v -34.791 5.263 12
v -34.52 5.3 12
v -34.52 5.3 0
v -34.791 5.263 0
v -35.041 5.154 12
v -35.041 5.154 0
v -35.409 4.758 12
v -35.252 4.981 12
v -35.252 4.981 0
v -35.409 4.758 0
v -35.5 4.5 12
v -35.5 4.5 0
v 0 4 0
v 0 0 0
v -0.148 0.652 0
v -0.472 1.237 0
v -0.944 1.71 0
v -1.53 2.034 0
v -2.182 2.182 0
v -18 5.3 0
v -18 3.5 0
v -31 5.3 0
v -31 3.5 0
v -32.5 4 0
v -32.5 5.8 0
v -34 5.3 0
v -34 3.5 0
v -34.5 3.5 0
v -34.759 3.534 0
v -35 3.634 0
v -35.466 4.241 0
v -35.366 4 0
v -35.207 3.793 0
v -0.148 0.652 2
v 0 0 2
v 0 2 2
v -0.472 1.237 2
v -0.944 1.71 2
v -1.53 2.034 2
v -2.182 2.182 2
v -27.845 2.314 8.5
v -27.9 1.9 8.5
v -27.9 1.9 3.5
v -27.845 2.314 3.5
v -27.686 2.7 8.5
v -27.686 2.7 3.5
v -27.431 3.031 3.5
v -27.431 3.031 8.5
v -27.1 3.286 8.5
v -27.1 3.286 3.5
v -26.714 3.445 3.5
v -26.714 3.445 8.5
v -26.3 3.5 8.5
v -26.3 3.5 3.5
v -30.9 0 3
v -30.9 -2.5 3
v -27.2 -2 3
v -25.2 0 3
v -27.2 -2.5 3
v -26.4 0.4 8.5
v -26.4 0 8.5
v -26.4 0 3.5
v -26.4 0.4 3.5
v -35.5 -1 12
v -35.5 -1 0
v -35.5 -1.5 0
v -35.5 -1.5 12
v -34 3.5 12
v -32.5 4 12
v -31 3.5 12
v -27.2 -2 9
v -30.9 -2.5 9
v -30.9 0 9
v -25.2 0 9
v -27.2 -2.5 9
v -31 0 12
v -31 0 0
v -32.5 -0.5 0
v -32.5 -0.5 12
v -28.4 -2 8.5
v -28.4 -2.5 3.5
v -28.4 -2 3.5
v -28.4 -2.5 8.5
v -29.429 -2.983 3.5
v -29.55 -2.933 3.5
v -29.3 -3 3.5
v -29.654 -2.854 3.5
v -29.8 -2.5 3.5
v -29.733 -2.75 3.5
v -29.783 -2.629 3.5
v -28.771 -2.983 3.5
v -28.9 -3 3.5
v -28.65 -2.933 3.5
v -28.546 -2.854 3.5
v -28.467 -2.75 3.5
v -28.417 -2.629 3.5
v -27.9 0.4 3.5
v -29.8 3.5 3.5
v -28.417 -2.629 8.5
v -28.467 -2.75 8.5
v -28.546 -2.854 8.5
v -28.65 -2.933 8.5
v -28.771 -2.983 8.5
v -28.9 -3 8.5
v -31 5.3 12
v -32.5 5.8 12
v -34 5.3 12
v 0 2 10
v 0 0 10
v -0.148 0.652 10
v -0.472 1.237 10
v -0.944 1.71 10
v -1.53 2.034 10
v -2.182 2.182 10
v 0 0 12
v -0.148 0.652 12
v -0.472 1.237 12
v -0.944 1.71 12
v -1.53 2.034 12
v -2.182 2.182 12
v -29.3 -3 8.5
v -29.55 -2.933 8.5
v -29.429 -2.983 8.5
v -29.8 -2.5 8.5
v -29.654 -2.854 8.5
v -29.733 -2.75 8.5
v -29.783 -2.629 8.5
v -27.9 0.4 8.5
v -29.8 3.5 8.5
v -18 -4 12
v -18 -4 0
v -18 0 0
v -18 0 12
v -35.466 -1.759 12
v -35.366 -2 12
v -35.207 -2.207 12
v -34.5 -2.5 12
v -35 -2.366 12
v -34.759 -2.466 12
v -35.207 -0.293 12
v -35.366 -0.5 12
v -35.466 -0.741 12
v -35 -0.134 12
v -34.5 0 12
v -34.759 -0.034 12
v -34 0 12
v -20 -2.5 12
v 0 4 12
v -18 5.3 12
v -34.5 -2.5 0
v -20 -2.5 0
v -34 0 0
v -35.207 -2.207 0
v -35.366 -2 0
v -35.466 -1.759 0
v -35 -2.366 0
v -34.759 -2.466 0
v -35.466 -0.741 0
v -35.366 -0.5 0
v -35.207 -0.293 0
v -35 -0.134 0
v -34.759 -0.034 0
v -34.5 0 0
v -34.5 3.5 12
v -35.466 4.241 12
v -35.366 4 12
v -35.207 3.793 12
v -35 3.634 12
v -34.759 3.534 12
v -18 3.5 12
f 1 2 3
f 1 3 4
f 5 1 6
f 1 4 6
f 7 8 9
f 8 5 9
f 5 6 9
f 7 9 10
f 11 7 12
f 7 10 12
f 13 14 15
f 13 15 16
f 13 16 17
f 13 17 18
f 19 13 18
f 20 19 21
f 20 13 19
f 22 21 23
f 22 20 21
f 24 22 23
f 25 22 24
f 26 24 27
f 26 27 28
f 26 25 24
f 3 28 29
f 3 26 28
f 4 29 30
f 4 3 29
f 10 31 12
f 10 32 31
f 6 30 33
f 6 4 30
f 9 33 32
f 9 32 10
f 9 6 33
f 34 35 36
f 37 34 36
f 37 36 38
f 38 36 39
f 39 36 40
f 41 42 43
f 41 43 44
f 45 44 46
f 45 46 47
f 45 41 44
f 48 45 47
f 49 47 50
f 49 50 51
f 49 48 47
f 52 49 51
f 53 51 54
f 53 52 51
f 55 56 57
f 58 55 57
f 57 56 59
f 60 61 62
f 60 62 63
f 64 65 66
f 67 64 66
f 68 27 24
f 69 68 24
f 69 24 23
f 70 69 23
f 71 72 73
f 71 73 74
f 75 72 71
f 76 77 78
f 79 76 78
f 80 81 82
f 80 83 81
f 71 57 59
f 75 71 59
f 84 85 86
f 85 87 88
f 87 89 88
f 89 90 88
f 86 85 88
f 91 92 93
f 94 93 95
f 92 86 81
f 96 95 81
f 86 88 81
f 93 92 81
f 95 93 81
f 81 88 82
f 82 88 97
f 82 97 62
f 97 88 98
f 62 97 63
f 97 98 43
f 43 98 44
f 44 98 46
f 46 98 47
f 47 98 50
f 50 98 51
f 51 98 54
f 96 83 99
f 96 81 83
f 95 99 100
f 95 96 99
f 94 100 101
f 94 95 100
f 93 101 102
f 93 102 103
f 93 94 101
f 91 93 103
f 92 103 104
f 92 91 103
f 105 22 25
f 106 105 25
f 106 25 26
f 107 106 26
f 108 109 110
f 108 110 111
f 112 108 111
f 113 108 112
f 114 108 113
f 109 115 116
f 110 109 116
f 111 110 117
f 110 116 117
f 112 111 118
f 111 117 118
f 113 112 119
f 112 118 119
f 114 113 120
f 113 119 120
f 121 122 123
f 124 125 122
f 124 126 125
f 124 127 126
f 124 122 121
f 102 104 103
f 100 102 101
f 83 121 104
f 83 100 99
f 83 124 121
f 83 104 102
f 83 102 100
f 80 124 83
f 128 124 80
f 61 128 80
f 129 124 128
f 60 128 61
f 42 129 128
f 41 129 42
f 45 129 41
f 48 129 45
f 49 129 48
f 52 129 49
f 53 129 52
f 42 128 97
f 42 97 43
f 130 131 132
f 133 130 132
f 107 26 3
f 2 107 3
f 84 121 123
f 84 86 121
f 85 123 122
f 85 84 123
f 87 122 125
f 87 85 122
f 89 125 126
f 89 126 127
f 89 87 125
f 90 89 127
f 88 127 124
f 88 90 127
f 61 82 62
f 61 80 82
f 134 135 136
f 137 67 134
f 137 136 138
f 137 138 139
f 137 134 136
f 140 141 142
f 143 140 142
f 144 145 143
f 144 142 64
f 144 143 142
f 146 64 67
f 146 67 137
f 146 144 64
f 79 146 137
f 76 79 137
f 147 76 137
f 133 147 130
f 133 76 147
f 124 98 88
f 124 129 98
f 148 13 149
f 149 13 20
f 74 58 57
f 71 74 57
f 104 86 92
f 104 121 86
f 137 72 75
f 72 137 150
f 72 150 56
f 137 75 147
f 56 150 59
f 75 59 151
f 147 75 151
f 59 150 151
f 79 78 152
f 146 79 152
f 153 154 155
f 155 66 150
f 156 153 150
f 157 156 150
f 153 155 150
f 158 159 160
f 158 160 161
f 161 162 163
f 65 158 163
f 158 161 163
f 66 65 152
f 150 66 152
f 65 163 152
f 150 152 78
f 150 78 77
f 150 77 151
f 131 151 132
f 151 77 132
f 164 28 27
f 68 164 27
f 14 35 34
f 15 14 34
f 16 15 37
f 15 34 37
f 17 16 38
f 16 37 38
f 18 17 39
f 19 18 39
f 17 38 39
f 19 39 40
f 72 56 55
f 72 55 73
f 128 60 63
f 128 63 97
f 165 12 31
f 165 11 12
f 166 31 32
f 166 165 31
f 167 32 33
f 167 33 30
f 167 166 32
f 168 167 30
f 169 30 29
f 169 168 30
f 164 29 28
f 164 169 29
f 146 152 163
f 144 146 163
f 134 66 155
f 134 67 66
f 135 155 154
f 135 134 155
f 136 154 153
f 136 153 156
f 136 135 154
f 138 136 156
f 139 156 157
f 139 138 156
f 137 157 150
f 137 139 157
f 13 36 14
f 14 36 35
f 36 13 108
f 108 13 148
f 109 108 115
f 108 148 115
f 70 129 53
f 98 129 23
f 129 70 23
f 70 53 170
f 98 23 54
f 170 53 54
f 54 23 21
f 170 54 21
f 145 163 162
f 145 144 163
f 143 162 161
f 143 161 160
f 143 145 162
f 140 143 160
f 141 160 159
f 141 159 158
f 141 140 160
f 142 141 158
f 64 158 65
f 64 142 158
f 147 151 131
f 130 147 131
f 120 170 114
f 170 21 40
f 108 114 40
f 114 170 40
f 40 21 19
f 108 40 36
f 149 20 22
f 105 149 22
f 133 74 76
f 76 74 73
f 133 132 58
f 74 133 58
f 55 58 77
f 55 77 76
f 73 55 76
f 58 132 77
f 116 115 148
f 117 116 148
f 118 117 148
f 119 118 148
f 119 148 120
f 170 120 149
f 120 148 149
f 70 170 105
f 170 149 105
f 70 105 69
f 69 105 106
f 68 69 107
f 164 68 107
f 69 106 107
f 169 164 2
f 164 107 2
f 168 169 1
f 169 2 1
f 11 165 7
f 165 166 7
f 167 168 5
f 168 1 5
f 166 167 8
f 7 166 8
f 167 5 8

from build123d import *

# Parameters (mm, degrees)
BOSS_EXTRUDE1_DEPTH   = 12
BOSS_EXTRUDE1_2_DEPTH = 12
SKETCH2_W             = 5.7
SKETCH2_H             = 6
CUT_EXTRUDE1_DEPTH    = 3
BOSS_EXTRUDE2_DEPTH   = 6
BOSS_EXTRUDE3_START   = -6
BOSS_EXTRUDE3_DEPTH   = 2.5
FILLET7_R             = 1
FILLET8_R             = 1
FILLET10_R            = 1
FILLET11_R            = 1
BOSS_EXTRUDE4_DEPTH   = 2
BOSS_EXTRUDE5_START   = -10
BOSS_EXTRUDE5_DEPTH   = 2
FILLET12_R            = 0.5


with BuildPart() as part:
    # Sketch1 → Boss-Extrude1 (new body)
    with BuildSketch(Plane.XY):
        Polygon((0, 4), (-18, 5.3), (-31, 5.3), (-32.5, 5.8), (-34, 5.3), (-35.5, 5.3), (-35.5, 3.5), (-34, 3.5), (-32.5, 4), (-31, 3.5), (-18, 3.5), (0, 2), align=None)
    extrude(amount=BOSS_EXTRUDE1_DEPTH)

    # Sketch4 → Boss-Extrude3 (add, symmetric)
    with BuildSketch(Plane.XY.offset(12).offset(BOSS_EXTRUDE3_START)):
        with BuildLine():
            Line((-28.4, -2), (-26.4, 0))
            Line((-26.4, 0), (-26.4, 0.4))
            Line((-26.4, 0.4), (-27.9, 0.4))
            Line((-27.9, 0.4), (-27.9, 1.9))
            ThreePointArc((-27.9, 1.9), (-27.43137085, 3.03137085), (-26.3, 3.5))
            Line((-26.3, 3.5), (-29.8, 3.5))
            Line((-29.8, 3.5), (-29.8, -3))
            Line((-29.8, -3), (-28.4, -3))
            Line((-28.4, -3), (-28.4, -2))
        make_face()
    extrude(amount=BOSS_EXTRUDE3_DEPTH, both=True)

    # Fillet8
    fillet8_edges = [part.edges().sort_by_distance(p)[0] for p in [
        (-35.5, 3.5, 6),
    ]]
    fillet(fillet8_edges, radius=FILLET8_R)

    # Fillet10
    # the kernel refuses this fillet: 1 mm, written as the material it takes off along each edge
    with BuildSketch(Plane(origin=(-35.5, 5.3, -2.449489743), x_dir=(1.545430450277731e-12, -1.0, 0), z_dir=(0, 0, 1))) as fillet10_piece_1:
        with BuildLine():
            CenterArc((1, 0.979795897), FILLET10_R, 180, 78.463040967)
            Line((0, 0.979795897), (-0.02, 0.979795897))
            Line((-0.02, 0.979795897), (-0.02, 0))
            Line((-0.02, 0), (0, -0.02))
            ThreePointArc((0, -0.02), (0.4, -0.02), (0.796, -0.019595918))
            Line((0.796, -0.019595918), (0.8, 0))
        make_face()
    extrude(amount=16.898979486, mode=Mode.SUBTRACT)

    # Sketch5 → Boss-Extrude4 (add)
    with BuildSketch(Plane.XY.offset(12)):
        with BuildLine():
            Line((0, 2), (0, 0))
            ThreePointArc((0, 0), (-0.691300526, 1.490517656), (-2.181818182, 2.181818182))
            Line((-2.181818182, 2.181818182), (0, 2))
        make_face()
    extrude(amount=-BOSS_EXTRUDE4_DEPTH)

    # Sketch5<2> → Boss-Extrude5 (add)
    with BuildSketch(Plane.XY.offset(12).offset(BOSS_EXTRUDE5_START)):
        with BuildLine():
            Line((0, 2), (0, 0))
            ThreePointArc((0, 0), (-0.691300526, 1.490517656), (-2.181818182, 2.181818182))
            Line((-2.181818182, 2.181818182), (0, 2))
        make_face()
    extrude(amount=-BOSS_EXTRUDE5_DEPTH)

    # Fillet12
    fillet12_edges = [part.edges().sort_by_distance(p)[0] for p in [
        (-28.4, -3, 6),
        (-29.8, -3, 6),
    ]]
    fillet(fillet12_edges, radius=FILLET12_R)


with BuildPart() as body_2:
    # Sketch1 → Boss-Extrude1 2 (new body)
    with BuildSketch(Plane.XY):
        Polygon((-35.5, -2.5), (-20, -2.5), (-18, -4), (-18, 0), (-31, 0), (-32.5, -0.5), (-34, 0), (-35.5, 0), align=None)
    extrude(amount=BOSS_EXTRUDE1_2_DEPTH)

    # Sketch2 → Cut-Extrude1 (cut)
    with BuildSketch(Plane.XZ.offset(2.5)):
        with Locations((-28.05, 6)):
            Rectangle(SKETCH2_W, SKETCH2_H)
    extrude(amount=-CUT_EXTRUDE1_DEPTH, mode=Mode.SUBTRACT)

    # Sketch3 → Boss-Extrude2 (add)
    with BuildSketch(Plane.XY.offset(3)):
        Polygon((-25.2, 0), (-27.2, -2), (-27.2, -2.5), (-25.2, -2.5), align=None)
    extrude(amount=BOSS_EXTRUDE2_DEPTH)

    # Fillet7
    fillet7_edges = [body_2.edges().sort_by_distance(p)[0] for p in [
        (-35.5, 0, 6),
    ]]
    fillet(fillet7_edges, radius=FILLET7_R)

    # Fillet11
    fillet11_edges = [body_2.edges().sort_by_distance(p)[0] for p in [
        (-35.5, -2.5, 6),
    ]]
    fillet(fillet11_edges, radius=FILLET11_R)


solid = Compound([part.part, body_2.part])
